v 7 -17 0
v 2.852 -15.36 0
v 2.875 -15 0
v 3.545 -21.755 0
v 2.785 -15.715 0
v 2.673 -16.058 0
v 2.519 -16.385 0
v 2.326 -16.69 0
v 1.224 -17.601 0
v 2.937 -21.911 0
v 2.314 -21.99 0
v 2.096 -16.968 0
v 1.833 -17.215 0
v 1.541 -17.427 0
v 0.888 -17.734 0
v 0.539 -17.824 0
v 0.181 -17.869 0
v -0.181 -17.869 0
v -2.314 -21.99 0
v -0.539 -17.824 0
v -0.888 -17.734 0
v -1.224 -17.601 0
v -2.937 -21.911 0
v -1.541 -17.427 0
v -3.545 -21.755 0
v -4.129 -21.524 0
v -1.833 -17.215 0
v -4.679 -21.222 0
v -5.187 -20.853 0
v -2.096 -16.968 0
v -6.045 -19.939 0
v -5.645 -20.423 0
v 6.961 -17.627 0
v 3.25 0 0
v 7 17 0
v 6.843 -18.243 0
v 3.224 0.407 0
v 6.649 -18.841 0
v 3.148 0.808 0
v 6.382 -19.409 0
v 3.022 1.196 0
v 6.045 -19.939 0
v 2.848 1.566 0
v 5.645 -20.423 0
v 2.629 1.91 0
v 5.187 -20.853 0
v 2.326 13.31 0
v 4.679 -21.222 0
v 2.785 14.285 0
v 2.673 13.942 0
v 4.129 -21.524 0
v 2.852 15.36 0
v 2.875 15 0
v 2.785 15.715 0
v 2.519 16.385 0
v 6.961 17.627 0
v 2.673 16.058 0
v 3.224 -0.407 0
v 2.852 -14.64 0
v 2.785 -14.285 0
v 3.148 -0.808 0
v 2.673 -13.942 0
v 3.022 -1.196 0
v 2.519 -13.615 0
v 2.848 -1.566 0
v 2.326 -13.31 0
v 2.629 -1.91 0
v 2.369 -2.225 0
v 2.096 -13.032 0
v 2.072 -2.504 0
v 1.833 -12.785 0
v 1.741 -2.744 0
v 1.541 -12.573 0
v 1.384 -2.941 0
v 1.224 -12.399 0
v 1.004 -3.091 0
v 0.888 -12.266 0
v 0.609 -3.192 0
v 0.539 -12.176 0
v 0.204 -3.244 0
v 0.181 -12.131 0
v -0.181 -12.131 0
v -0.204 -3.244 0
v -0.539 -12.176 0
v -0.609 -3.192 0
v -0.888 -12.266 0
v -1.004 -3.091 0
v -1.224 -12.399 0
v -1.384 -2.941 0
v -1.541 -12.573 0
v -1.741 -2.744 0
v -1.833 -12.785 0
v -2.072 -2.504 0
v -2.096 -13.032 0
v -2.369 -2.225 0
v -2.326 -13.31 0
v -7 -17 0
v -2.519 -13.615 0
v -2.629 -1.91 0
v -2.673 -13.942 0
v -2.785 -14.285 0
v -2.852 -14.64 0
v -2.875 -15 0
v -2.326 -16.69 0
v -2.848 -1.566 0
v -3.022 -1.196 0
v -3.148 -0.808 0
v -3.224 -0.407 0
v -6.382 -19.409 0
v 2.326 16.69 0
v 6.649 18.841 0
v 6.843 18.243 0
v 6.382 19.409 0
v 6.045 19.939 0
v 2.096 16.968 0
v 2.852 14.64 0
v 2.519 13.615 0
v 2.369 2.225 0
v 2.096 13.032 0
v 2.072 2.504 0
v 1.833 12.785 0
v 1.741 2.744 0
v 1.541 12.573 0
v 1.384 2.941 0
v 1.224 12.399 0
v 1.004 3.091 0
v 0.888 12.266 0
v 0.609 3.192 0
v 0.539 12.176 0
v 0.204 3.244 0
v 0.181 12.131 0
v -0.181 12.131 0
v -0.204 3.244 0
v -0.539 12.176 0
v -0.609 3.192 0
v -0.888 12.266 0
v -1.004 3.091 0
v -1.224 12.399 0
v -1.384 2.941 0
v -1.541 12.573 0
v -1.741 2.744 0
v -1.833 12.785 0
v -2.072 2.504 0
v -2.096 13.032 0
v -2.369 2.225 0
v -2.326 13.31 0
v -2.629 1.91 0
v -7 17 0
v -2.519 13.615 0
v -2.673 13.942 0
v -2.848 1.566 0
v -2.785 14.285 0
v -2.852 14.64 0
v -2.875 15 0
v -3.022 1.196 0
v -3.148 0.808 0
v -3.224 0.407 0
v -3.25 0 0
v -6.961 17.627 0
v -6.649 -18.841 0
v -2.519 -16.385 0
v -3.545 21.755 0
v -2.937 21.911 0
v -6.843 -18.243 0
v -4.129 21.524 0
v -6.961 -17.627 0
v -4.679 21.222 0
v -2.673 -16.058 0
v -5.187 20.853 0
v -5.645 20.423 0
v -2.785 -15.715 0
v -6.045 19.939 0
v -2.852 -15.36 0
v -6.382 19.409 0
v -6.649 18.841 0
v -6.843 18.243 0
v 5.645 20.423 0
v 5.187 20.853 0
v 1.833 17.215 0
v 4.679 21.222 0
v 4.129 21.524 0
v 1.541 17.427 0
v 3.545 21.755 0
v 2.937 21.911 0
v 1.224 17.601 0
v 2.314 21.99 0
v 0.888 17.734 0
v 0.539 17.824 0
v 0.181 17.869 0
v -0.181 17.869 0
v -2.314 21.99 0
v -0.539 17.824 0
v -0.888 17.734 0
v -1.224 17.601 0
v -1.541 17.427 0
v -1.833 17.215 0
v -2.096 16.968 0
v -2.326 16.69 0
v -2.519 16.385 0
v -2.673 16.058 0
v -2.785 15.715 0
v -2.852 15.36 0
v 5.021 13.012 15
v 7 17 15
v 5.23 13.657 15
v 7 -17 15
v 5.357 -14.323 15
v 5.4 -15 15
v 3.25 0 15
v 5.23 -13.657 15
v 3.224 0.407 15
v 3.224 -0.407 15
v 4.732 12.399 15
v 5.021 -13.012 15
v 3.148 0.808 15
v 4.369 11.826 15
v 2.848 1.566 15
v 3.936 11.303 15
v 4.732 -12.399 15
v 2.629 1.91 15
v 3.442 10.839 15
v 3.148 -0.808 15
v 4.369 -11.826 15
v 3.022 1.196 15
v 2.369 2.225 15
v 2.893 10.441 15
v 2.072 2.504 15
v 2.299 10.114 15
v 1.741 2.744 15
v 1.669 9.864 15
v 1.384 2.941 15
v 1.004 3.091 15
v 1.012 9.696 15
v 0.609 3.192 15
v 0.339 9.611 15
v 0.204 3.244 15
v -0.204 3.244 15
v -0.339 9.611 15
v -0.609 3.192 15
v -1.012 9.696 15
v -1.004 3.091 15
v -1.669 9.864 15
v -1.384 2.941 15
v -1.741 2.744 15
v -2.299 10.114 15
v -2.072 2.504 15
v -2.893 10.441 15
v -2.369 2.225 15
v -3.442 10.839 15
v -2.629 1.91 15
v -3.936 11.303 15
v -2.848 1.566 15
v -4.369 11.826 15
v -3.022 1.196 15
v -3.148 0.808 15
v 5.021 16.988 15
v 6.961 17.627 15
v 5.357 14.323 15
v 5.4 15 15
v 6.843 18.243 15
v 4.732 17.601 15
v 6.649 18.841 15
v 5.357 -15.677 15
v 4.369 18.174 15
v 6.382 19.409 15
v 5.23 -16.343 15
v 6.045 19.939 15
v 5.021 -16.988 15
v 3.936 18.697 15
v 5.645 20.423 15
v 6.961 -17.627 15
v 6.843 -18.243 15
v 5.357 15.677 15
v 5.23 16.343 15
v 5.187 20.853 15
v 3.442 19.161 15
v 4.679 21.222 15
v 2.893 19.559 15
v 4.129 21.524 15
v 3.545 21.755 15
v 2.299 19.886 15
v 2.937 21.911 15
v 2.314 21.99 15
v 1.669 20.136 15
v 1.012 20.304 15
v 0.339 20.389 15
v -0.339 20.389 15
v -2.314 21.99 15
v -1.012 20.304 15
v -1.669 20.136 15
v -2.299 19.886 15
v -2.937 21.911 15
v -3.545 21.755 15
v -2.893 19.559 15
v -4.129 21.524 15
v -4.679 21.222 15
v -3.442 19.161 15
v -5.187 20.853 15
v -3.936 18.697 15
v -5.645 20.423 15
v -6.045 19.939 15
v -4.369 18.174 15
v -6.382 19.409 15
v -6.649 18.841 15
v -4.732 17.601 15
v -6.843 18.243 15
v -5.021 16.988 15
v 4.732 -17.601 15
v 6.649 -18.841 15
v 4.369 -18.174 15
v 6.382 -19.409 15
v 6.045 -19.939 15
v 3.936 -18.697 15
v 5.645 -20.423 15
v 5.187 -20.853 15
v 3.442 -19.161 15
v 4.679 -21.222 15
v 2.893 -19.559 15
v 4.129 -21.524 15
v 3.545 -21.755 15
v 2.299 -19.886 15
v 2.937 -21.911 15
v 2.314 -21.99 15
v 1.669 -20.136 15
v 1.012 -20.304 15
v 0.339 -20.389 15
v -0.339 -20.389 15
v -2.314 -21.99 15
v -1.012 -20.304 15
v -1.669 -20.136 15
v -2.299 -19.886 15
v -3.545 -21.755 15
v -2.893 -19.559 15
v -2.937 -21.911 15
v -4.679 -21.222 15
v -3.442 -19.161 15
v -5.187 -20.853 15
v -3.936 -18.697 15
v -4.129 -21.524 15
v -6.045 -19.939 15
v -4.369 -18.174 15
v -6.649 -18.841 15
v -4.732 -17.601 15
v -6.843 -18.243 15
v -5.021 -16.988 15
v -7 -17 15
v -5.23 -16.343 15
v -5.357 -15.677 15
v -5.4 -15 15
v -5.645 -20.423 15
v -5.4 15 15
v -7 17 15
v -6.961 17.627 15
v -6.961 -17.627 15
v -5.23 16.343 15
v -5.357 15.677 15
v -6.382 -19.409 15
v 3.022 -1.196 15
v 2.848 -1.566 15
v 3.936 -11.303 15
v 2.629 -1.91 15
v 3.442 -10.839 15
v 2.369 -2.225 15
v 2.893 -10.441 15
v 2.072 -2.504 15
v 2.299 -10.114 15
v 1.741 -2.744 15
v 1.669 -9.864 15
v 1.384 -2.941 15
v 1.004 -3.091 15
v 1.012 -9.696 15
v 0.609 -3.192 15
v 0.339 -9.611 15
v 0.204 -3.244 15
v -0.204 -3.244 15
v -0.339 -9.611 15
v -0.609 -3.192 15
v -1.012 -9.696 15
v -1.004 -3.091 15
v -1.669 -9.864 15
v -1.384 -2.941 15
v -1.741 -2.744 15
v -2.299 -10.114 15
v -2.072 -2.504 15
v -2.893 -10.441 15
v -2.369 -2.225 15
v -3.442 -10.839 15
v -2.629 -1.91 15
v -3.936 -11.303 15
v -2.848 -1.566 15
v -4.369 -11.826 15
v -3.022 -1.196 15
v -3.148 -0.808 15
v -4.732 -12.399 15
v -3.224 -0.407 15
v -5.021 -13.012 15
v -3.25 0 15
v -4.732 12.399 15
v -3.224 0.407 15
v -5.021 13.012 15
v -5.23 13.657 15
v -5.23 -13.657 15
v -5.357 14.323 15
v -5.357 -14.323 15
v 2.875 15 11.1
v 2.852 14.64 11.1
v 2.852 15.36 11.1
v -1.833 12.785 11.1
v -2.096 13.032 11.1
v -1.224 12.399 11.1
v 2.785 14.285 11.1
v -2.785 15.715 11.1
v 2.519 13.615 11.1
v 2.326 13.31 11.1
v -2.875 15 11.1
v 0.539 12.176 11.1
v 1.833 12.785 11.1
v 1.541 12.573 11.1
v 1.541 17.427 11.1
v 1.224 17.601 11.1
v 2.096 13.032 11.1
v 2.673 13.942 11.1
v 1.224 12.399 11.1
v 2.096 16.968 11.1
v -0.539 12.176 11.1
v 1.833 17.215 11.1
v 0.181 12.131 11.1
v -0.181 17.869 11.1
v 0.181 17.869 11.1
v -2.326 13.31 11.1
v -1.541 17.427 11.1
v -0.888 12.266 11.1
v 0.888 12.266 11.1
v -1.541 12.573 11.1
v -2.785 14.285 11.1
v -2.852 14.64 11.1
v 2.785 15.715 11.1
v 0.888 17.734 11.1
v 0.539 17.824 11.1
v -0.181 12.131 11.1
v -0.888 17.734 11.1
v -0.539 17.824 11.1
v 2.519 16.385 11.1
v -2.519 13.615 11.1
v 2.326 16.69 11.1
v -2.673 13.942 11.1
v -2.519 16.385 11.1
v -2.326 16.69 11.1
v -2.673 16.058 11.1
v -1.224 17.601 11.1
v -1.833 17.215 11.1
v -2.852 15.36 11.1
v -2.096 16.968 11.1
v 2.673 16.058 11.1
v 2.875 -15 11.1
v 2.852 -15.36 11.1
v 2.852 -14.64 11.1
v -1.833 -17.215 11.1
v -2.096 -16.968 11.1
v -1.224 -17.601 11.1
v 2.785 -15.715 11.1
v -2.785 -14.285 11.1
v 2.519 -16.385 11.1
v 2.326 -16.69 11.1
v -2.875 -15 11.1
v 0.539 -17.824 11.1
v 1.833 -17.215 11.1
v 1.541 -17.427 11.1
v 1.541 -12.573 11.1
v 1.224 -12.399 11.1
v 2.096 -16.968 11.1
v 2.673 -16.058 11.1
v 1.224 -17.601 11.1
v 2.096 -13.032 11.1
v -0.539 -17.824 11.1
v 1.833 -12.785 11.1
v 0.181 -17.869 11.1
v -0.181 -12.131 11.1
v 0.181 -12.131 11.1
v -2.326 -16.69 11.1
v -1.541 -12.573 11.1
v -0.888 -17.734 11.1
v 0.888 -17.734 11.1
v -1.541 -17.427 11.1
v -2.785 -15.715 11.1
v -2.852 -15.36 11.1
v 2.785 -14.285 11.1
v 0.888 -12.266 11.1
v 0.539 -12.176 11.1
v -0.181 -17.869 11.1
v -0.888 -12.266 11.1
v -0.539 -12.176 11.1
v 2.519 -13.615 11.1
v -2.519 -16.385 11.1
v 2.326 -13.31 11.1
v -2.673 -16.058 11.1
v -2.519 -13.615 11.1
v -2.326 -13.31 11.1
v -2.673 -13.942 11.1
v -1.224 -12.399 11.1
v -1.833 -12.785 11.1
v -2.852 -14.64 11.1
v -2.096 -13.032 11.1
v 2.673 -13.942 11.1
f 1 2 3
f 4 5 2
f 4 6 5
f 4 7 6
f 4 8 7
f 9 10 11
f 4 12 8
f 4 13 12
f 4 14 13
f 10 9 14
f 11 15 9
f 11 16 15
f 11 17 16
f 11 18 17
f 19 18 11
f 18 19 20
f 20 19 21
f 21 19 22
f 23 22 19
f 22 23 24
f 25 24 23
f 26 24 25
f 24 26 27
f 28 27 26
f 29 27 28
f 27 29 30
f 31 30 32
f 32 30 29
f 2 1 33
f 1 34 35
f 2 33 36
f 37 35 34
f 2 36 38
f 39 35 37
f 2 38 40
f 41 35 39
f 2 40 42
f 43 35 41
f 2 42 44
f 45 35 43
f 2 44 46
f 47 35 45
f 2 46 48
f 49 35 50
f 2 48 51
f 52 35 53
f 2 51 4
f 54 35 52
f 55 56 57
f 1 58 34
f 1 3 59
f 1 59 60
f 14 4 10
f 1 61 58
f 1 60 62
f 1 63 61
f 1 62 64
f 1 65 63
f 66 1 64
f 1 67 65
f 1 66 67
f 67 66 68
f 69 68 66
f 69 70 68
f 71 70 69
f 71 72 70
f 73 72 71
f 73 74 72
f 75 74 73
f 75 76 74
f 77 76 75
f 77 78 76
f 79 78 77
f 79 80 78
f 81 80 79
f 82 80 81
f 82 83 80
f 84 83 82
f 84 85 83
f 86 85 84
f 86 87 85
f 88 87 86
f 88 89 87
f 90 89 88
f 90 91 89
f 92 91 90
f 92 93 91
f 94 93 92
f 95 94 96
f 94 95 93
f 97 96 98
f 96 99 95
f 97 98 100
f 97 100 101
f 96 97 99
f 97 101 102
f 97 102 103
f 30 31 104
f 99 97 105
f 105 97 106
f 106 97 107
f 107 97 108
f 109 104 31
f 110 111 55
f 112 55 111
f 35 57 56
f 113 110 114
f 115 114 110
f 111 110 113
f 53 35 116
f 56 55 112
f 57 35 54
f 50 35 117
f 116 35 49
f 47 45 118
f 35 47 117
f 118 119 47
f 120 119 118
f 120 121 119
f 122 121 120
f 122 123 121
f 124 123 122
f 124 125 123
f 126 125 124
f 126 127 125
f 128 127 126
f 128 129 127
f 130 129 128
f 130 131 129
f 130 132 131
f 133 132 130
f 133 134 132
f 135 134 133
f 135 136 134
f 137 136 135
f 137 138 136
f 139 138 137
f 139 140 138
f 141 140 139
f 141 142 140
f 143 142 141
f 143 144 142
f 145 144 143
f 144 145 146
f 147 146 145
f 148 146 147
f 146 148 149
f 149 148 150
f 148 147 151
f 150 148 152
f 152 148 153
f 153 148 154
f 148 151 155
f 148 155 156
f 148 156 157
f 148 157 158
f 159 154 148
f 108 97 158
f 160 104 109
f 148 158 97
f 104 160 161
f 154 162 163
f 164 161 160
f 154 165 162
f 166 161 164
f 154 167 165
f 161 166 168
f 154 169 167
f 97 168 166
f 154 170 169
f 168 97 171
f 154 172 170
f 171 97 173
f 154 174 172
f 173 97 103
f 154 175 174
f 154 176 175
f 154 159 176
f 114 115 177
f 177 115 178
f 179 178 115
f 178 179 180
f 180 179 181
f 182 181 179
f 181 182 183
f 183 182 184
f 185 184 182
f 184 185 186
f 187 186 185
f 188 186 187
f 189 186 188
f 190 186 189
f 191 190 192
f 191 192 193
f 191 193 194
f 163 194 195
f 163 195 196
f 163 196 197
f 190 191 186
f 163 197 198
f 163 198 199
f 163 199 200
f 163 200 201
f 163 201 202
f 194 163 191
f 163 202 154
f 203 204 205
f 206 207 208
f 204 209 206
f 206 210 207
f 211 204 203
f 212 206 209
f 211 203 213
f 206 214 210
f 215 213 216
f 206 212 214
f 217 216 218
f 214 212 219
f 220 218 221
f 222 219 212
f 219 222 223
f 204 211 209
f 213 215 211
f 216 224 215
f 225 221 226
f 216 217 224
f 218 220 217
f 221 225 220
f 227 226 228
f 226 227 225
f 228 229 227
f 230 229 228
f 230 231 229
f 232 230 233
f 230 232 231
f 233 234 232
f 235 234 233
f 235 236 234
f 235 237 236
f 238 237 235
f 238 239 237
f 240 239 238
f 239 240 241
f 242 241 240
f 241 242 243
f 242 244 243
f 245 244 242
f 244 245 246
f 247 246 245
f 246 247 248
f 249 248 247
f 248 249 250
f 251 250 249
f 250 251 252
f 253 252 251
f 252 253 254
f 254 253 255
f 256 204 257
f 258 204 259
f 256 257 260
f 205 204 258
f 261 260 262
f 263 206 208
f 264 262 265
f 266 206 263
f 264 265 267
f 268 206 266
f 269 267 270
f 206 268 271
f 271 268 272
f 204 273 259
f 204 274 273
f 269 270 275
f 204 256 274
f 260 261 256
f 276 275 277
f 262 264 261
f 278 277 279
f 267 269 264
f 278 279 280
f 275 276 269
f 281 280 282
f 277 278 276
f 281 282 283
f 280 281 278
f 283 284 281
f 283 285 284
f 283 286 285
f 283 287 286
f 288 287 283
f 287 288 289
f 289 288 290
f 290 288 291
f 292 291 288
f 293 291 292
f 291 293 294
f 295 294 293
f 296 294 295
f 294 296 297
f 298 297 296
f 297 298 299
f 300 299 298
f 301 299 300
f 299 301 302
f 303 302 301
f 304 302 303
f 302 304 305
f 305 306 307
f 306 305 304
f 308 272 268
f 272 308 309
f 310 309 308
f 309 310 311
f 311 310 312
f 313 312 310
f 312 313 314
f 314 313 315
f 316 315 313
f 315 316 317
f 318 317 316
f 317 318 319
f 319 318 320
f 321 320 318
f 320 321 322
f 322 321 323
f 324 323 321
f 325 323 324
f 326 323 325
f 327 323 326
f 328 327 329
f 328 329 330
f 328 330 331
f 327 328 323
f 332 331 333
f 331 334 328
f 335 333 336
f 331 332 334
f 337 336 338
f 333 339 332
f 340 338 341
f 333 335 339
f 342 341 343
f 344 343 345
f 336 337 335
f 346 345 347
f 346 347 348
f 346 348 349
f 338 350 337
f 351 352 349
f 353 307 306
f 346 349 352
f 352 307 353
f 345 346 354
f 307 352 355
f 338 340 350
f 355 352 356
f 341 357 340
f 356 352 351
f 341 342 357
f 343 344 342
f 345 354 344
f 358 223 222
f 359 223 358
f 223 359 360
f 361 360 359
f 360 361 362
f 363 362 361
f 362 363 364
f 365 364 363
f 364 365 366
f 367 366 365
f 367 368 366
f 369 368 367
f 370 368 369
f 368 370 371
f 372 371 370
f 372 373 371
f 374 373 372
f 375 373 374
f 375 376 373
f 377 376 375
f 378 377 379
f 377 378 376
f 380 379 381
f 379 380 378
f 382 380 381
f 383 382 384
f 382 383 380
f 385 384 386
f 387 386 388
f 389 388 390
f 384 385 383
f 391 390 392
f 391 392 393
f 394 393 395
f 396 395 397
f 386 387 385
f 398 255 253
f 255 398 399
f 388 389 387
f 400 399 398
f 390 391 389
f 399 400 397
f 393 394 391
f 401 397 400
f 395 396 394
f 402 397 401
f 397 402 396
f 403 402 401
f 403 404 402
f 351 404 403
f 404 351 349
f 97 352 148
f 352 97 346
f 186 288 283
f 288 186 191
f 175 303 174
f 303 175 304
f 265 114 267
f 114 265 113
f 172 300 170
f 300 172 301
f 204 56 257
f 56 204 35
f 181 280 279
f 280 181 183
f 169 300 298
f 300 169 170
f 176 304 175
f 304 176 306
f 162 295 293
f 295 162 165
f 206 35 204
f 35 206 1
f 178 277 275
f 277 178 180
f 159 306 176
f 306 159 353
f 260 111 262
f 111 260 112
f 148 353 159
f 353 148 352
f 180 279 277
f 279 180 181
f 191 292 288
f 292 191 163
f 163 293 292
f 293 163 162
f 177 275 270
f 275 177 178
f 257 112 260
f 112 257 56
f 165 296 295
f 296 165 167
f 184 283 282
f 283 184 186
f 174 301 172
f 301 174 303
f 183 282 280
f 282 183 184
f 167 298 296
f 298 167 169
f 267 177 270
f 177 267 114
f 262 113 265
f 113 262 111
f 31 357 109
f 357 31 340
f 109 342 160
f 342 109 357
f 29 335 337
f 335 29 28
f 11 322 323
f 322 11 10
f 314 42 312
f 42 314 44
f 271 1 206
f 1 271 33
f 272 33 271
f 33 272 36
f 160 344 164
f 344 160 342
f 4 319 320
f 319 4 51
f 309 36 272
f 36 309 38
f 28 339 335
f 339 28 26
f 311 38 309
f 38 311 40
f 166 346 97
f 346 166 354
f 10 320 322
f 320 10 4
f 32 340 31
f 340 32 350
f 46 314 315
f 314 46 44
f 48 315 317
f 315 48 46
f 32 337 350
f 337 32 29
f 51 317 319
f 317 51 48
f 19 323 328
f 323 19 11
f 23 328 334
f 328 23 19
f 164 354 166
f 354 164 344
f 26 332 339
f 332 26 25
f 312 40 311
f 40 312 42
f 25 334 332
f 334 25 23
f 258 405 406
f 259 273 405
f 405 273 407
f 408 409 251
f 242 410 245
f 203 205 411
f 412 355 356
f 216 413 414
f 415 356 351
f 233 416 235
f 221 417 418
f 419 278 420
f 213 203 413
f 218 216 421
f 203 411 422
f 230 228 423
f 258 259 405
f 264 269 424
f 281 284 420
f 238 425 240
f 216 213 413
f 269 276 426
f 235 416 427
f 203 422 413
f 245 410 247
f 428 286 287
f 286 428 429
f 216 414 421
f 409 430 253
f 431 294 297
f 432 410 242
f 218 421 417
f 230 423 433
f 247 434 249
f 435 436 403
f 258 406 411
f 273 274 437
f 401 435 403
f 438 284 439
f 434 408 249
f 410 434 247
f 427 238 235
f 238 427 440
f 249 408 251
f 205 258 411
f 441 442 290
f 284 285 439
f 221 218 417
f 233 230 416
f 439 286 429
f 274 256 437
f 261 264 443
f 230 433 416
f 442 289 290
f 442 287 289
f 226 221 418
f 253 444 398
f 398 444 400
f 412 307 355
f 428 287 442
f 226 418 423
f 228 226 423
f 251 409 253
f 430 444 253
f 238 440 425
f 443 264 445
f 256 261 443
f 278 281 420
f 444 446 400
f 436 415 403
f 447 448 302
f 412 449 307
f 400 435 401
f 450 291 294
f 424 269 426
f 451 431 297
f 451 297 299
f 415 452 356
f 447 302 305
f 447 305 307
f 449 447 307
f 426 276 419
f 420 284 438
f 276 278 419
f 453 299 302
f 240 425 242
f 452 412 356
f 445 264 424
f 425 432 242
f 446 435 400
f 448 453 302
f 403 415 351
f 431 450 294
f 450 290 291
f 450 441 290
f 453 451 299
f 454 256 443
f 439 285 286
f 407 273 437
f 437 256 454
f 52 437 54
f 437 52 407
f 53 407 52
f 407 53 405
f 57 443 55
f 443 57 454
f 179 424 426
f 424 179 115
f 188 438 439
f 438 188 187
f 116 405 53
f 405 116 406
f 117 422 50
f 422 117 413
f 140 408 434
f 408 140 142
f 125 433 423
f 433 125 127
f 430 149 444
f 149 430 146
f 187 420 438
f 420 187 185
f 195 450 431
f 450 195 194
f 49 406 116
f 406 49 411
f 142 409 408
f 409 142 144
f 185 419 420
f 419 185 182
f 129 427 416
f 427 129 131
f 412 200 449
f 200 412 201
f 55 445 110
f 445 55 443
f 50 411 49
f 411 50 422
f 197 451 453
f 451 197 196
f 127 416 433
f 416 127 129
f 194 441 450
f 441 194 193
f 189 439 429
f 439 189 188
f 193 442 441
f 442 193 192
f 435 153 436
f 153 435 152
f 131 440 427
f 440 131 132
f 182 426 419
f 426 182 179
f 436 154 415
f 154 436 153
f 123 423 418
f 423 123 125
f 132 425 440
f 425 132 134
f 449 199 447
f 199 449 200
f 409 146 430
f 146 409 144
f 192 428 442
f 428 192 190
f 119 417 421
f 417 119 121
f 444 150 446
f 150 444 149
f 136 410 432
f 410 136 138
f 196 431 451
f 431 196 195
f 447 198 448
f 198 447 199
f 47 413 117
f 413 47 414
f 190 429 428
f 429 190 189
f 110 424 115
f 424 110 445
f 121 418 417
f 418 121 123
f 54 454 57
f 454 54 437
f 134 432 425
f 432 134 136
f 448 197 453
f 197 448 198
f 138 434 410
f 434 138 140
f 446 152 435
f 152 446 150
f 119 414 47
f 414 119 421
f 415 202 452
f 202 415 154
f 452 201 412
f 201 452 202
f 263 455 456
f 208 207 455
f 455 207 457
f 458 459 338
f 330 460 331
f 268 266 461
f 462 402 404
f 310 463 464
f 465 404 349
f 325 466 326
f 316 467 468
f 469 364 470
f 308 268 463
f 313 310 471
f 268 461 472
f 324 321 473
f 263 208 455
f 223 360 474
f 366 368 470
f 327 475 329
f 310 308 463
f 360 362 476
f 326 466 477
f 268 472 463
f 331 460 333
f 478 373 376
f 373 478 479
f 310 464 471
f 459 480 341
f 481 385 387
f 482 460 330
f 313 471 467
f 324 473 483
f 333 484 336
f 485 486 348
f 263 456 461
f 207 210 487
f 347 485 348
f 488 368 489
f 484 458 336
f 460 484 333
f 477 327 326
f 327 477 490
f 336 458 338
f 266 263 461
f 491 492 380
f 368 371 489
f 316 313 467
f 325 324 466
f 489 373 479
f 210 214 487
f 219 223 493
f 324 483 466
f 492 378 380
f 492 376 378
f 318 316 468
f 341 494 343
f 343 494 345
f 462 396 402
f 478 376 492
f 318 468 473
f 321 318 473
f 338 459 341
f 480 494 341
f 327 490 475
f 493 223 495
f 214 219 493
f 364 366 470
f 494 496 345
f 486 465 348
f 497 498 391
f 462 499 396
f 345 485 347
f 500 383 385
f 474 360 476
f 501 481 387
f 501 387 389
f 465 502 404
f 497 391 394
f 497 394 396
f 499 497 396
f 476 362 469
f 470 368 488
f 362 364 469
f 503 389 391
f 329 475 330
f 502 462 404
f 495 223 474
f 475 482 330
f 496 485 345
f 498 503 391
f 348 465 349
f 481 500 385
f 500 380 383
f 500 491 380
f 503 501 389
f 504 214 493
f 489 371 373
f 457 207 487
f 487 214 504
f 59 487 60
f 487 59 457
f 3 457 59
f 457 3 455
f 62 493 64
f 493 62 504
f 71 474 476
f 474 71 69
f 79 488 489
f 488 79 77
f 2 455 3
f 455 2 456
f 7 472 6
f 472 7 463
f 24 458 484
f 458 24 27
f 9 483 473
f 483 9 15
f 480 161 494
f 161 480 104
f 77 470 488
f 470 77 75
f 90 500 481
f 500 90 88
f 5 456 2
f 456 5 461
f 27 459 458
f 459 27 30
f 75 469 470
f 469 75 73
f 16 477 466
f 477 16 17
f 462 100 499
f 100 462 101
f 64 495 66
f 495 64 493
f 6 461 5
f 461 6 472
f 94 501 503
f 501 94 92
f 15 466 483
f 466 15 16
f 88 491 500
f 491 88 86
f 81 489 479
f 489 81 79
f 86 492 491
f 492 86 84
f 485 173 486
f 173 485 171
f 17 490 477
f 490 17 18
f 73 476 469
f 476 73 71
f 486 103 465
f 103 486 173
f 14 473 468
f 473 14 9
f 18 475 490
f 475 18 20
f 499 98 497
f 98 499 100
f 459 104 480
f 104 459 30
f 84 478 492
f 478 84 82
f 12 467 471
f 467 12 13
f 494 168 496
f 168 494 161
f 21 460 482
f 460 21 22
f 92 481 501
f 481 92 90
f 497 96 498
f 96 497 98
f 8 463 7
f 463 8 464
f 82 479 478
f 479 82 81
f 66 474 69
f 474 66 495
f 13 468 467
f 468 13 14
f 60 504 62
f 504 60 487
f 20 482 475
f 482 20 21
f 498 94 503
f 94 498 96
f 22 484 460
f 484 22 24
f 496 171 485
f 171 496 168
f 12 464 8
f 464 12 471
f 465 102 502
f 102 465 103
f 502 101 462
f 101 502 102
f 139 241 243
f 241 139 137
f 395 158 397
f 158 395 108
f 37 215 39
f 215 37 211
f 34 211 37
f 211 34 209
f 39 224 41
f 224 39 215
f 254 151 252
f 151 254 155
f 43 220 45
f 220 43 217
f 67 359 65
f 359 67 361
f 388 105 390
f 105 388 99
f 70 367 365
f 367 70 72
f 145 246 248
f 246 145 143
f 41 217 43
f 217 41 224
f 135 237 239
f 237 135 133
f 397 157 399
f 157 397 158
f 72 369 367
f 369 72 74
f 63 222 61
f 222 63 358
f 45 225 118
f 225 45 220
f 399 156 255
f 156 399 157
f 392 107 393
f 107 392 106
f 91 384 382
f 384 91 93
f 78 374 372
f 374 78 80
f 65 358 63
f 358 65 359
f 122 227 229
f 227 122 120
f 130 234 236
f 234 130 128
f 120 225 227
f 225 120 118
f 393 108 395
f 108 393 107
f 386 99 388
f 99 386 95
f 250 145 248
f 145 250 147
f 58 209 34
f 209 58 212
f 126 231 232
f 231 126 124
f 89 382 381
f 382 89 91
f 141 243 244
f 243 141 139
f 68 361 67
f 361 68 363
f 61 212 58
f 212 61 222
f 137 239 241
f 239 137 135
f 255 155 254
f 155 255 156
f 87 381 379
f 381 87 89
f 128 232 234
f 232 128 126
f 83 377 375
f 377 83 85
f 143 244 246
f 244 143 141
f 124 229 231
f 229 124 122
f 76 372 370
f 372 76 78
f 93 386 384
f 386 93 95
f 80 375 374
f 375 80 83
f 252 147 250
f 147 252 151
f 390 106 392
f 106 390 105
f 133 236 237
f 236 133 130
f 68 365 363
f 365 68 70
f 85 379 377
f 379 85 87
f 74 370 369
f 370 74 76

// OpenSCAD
$fn = 50;


difference() {
	union() {
		cylinder(h = 15, r = 7.0000000000);
		translate(v = [0.0000000000, 7.5000000000, 0]) {
			hull() {
				translate(v = [-2.0000000000, 9.5000000000, 0]) {
					cylinder(h = 15, r = 5);
				}
				translate(v = [2.0000000000, 9.5000000000, 0]) {
					cylinder(h = 15, r = 5);
				}
				translate(v = [-2.0000000000, -9.5000000000, 0]) {
					cylinder(h = 15, r = 5);
				}
				translate(v = [2.0000000000, -9.5000000000, 0]) {
					cylinder(h = 15, r = 5);
				}
			}
		}
		translate(v = [0.0000000000, 7.5000000000, 0]) {
			hull() {
				translate(v = [-2.0000000000, 9.5000000000, 0]) {
					cylinder(h = 15, r = 5);
				}
				translate(v = [2.0000000000, 9.5000000000, 0]) {
					cylinder(h = 15, r = 5);
				}
				translate(v = [-2.0000000000, -9.5000000000, 0]) {
					cylinder(h = 15, r = 5);
				}
				translate(v = [2.0000000000, -9.5000000000, 0]) {
					cylinder(h = 15, r = 5);
				}
			}
		}
		translate(v = [0.0000000000, -7.5000000000, 0]) {
			hull() {
				translate(v = [-2.0000000000, 9.5000000000, 0]) {
					cylinder(h = 15, r = 5);
				}
				translate(v = [2.0000000000, 9.5000000000, 0]) {
					cylinder(h = 15, r = 5);
				}
				translate(v = [-2.0000000000, -9.5000000000, 0]) {
					cylinder(h = 15, r = 5);
				}
				translate(v = [2.0000000000, -9.5000000000, 0]) {
					cylinder(h = 15, r = 5);
				}
			}
		}
		translate(v = [0.0000000000, -7.5000000000, 0]) {
			hull() {
				translate(v = [-2.0000000000, 9.5000000000, 0]) {
					cylinder(h = 15, r = 5);
				}
				translate(v = [2.0000000000, 9.5000000000, 0]) {
					cylinder(h = 15, r = 5);
				}
				translate(v = [-2.0000000000, -9.5000000000, 0]) {
					cylinder(h = 15, r = 5);
				}
				translate(v = [2.0000000000, -9.5000000000, 0]) {
					cylinder(h = 15, r = 5);
				}
			}
		}
	}
	union() {
		translate(v = [0.0000000000, 15.0000000000, 15]) {
			rotate(a = [0, 0, 0]) {
				difference() {
					union() {
						#translate(v = [0, 0, -15.0000000000]) {
							cylinder(h = 15, r = 2.6000000000);
						}
						#translate(v = [0, 0, -3.9000000000]) {
							cylinder(h = 3.9000000000, r1 = 2.8750000000, r2 = 5.4000000000);
						}
						#translate(v = [0, 0, -15.0000000000]) {
							cylinder(h = 15, r = 2.8750000000);
						}
						#translate(v = [0, 0, -15.0000000000]) {
							cylinder(h = 15, r = 2.6000000000);
						}
					}
					union();
				}
			}
		}
		translate(v = [0.0000000000, 15.0000000000, 15]) {
			rotate(a = [0, 0, 0]) {
				difference() {
					union() {
						#translate(v = [0, 0, -15.0000000000]) {
							cylinder(h = 15, r = 2.6000000000);
						}
						#translate(v = [0, 0, -3.9000000000]) {
							cylinder(h = 3.9000000000, r1 = 2.8750000000, r2 = 5.4000000000);
						}
						#translate(v = [0, 0, -15.0000000000]) {
							cylinder(h = 15, r = 2.8750000000);
						}
						#translate(v = [0, 0, -15.0000000000]) {
							cylinder(h = 15, r = 2.6000000000);
						}
					}
					union();
				}
			}
		}
		translate(v = [0.0000000000, -15.0000000000, 15]) {
			rotate(a = [0, 0, 0]) {
				difference() {
					union() {
						#translate(v = [0, 0, -15.0000000000]) {
							cylinder(h = 15, r = 2.6000000000);
						}
						#translate(v = [0, 0, -3.9000000000]) {
							cylinder(h = 3.9000000000, r1 = 2.8750000000, r2 = 5.4000000000);
						}
						#translate(v = [0, 0, -15.0000000000]) {
							cylinder(h = 15, r = 2.8750000000);
						}
						#translate(v = [0, 0, -15.0000000000]) {
							cylinder(h = 15, r = 2.6000000000);
						}
					}
					union();
				}
			}
		}
		translate(v = [0.0000000000, -15.0000000000, 15]) {
			rotate(a = [0, 0, 0]) {
				difference() {
					union() {
						#translate(v = [0, 0, -15.0000000000]) {
							cylinder(h = 15, r = 2.6000000000);
						}
						#translate(v = [0, 0, -3.9000000000]) {
							cylinder(h = 3.9000000000, r1 = 2.8750000000, r2 = 5.4000000000);
						}
						#translate(v = [0, 0, -15.0000000000]) {
							cylinder(h = 15, r = 2.8750000000);
						}
						#translate(v = [0, 0, -15.0000000000]) {
							cylinder(h = 15, r = 2.6000000000);
						}
					}
					union();
				}
			}
		}
		translate(v = [0, 0, -100]) {
			cylinder(h = 200, r = 3.2500000000);
		}
		translate(v = [0, 0, -100]) {
			cylinder(h = 200, r = 1.8000000000);
		}
	}
}
